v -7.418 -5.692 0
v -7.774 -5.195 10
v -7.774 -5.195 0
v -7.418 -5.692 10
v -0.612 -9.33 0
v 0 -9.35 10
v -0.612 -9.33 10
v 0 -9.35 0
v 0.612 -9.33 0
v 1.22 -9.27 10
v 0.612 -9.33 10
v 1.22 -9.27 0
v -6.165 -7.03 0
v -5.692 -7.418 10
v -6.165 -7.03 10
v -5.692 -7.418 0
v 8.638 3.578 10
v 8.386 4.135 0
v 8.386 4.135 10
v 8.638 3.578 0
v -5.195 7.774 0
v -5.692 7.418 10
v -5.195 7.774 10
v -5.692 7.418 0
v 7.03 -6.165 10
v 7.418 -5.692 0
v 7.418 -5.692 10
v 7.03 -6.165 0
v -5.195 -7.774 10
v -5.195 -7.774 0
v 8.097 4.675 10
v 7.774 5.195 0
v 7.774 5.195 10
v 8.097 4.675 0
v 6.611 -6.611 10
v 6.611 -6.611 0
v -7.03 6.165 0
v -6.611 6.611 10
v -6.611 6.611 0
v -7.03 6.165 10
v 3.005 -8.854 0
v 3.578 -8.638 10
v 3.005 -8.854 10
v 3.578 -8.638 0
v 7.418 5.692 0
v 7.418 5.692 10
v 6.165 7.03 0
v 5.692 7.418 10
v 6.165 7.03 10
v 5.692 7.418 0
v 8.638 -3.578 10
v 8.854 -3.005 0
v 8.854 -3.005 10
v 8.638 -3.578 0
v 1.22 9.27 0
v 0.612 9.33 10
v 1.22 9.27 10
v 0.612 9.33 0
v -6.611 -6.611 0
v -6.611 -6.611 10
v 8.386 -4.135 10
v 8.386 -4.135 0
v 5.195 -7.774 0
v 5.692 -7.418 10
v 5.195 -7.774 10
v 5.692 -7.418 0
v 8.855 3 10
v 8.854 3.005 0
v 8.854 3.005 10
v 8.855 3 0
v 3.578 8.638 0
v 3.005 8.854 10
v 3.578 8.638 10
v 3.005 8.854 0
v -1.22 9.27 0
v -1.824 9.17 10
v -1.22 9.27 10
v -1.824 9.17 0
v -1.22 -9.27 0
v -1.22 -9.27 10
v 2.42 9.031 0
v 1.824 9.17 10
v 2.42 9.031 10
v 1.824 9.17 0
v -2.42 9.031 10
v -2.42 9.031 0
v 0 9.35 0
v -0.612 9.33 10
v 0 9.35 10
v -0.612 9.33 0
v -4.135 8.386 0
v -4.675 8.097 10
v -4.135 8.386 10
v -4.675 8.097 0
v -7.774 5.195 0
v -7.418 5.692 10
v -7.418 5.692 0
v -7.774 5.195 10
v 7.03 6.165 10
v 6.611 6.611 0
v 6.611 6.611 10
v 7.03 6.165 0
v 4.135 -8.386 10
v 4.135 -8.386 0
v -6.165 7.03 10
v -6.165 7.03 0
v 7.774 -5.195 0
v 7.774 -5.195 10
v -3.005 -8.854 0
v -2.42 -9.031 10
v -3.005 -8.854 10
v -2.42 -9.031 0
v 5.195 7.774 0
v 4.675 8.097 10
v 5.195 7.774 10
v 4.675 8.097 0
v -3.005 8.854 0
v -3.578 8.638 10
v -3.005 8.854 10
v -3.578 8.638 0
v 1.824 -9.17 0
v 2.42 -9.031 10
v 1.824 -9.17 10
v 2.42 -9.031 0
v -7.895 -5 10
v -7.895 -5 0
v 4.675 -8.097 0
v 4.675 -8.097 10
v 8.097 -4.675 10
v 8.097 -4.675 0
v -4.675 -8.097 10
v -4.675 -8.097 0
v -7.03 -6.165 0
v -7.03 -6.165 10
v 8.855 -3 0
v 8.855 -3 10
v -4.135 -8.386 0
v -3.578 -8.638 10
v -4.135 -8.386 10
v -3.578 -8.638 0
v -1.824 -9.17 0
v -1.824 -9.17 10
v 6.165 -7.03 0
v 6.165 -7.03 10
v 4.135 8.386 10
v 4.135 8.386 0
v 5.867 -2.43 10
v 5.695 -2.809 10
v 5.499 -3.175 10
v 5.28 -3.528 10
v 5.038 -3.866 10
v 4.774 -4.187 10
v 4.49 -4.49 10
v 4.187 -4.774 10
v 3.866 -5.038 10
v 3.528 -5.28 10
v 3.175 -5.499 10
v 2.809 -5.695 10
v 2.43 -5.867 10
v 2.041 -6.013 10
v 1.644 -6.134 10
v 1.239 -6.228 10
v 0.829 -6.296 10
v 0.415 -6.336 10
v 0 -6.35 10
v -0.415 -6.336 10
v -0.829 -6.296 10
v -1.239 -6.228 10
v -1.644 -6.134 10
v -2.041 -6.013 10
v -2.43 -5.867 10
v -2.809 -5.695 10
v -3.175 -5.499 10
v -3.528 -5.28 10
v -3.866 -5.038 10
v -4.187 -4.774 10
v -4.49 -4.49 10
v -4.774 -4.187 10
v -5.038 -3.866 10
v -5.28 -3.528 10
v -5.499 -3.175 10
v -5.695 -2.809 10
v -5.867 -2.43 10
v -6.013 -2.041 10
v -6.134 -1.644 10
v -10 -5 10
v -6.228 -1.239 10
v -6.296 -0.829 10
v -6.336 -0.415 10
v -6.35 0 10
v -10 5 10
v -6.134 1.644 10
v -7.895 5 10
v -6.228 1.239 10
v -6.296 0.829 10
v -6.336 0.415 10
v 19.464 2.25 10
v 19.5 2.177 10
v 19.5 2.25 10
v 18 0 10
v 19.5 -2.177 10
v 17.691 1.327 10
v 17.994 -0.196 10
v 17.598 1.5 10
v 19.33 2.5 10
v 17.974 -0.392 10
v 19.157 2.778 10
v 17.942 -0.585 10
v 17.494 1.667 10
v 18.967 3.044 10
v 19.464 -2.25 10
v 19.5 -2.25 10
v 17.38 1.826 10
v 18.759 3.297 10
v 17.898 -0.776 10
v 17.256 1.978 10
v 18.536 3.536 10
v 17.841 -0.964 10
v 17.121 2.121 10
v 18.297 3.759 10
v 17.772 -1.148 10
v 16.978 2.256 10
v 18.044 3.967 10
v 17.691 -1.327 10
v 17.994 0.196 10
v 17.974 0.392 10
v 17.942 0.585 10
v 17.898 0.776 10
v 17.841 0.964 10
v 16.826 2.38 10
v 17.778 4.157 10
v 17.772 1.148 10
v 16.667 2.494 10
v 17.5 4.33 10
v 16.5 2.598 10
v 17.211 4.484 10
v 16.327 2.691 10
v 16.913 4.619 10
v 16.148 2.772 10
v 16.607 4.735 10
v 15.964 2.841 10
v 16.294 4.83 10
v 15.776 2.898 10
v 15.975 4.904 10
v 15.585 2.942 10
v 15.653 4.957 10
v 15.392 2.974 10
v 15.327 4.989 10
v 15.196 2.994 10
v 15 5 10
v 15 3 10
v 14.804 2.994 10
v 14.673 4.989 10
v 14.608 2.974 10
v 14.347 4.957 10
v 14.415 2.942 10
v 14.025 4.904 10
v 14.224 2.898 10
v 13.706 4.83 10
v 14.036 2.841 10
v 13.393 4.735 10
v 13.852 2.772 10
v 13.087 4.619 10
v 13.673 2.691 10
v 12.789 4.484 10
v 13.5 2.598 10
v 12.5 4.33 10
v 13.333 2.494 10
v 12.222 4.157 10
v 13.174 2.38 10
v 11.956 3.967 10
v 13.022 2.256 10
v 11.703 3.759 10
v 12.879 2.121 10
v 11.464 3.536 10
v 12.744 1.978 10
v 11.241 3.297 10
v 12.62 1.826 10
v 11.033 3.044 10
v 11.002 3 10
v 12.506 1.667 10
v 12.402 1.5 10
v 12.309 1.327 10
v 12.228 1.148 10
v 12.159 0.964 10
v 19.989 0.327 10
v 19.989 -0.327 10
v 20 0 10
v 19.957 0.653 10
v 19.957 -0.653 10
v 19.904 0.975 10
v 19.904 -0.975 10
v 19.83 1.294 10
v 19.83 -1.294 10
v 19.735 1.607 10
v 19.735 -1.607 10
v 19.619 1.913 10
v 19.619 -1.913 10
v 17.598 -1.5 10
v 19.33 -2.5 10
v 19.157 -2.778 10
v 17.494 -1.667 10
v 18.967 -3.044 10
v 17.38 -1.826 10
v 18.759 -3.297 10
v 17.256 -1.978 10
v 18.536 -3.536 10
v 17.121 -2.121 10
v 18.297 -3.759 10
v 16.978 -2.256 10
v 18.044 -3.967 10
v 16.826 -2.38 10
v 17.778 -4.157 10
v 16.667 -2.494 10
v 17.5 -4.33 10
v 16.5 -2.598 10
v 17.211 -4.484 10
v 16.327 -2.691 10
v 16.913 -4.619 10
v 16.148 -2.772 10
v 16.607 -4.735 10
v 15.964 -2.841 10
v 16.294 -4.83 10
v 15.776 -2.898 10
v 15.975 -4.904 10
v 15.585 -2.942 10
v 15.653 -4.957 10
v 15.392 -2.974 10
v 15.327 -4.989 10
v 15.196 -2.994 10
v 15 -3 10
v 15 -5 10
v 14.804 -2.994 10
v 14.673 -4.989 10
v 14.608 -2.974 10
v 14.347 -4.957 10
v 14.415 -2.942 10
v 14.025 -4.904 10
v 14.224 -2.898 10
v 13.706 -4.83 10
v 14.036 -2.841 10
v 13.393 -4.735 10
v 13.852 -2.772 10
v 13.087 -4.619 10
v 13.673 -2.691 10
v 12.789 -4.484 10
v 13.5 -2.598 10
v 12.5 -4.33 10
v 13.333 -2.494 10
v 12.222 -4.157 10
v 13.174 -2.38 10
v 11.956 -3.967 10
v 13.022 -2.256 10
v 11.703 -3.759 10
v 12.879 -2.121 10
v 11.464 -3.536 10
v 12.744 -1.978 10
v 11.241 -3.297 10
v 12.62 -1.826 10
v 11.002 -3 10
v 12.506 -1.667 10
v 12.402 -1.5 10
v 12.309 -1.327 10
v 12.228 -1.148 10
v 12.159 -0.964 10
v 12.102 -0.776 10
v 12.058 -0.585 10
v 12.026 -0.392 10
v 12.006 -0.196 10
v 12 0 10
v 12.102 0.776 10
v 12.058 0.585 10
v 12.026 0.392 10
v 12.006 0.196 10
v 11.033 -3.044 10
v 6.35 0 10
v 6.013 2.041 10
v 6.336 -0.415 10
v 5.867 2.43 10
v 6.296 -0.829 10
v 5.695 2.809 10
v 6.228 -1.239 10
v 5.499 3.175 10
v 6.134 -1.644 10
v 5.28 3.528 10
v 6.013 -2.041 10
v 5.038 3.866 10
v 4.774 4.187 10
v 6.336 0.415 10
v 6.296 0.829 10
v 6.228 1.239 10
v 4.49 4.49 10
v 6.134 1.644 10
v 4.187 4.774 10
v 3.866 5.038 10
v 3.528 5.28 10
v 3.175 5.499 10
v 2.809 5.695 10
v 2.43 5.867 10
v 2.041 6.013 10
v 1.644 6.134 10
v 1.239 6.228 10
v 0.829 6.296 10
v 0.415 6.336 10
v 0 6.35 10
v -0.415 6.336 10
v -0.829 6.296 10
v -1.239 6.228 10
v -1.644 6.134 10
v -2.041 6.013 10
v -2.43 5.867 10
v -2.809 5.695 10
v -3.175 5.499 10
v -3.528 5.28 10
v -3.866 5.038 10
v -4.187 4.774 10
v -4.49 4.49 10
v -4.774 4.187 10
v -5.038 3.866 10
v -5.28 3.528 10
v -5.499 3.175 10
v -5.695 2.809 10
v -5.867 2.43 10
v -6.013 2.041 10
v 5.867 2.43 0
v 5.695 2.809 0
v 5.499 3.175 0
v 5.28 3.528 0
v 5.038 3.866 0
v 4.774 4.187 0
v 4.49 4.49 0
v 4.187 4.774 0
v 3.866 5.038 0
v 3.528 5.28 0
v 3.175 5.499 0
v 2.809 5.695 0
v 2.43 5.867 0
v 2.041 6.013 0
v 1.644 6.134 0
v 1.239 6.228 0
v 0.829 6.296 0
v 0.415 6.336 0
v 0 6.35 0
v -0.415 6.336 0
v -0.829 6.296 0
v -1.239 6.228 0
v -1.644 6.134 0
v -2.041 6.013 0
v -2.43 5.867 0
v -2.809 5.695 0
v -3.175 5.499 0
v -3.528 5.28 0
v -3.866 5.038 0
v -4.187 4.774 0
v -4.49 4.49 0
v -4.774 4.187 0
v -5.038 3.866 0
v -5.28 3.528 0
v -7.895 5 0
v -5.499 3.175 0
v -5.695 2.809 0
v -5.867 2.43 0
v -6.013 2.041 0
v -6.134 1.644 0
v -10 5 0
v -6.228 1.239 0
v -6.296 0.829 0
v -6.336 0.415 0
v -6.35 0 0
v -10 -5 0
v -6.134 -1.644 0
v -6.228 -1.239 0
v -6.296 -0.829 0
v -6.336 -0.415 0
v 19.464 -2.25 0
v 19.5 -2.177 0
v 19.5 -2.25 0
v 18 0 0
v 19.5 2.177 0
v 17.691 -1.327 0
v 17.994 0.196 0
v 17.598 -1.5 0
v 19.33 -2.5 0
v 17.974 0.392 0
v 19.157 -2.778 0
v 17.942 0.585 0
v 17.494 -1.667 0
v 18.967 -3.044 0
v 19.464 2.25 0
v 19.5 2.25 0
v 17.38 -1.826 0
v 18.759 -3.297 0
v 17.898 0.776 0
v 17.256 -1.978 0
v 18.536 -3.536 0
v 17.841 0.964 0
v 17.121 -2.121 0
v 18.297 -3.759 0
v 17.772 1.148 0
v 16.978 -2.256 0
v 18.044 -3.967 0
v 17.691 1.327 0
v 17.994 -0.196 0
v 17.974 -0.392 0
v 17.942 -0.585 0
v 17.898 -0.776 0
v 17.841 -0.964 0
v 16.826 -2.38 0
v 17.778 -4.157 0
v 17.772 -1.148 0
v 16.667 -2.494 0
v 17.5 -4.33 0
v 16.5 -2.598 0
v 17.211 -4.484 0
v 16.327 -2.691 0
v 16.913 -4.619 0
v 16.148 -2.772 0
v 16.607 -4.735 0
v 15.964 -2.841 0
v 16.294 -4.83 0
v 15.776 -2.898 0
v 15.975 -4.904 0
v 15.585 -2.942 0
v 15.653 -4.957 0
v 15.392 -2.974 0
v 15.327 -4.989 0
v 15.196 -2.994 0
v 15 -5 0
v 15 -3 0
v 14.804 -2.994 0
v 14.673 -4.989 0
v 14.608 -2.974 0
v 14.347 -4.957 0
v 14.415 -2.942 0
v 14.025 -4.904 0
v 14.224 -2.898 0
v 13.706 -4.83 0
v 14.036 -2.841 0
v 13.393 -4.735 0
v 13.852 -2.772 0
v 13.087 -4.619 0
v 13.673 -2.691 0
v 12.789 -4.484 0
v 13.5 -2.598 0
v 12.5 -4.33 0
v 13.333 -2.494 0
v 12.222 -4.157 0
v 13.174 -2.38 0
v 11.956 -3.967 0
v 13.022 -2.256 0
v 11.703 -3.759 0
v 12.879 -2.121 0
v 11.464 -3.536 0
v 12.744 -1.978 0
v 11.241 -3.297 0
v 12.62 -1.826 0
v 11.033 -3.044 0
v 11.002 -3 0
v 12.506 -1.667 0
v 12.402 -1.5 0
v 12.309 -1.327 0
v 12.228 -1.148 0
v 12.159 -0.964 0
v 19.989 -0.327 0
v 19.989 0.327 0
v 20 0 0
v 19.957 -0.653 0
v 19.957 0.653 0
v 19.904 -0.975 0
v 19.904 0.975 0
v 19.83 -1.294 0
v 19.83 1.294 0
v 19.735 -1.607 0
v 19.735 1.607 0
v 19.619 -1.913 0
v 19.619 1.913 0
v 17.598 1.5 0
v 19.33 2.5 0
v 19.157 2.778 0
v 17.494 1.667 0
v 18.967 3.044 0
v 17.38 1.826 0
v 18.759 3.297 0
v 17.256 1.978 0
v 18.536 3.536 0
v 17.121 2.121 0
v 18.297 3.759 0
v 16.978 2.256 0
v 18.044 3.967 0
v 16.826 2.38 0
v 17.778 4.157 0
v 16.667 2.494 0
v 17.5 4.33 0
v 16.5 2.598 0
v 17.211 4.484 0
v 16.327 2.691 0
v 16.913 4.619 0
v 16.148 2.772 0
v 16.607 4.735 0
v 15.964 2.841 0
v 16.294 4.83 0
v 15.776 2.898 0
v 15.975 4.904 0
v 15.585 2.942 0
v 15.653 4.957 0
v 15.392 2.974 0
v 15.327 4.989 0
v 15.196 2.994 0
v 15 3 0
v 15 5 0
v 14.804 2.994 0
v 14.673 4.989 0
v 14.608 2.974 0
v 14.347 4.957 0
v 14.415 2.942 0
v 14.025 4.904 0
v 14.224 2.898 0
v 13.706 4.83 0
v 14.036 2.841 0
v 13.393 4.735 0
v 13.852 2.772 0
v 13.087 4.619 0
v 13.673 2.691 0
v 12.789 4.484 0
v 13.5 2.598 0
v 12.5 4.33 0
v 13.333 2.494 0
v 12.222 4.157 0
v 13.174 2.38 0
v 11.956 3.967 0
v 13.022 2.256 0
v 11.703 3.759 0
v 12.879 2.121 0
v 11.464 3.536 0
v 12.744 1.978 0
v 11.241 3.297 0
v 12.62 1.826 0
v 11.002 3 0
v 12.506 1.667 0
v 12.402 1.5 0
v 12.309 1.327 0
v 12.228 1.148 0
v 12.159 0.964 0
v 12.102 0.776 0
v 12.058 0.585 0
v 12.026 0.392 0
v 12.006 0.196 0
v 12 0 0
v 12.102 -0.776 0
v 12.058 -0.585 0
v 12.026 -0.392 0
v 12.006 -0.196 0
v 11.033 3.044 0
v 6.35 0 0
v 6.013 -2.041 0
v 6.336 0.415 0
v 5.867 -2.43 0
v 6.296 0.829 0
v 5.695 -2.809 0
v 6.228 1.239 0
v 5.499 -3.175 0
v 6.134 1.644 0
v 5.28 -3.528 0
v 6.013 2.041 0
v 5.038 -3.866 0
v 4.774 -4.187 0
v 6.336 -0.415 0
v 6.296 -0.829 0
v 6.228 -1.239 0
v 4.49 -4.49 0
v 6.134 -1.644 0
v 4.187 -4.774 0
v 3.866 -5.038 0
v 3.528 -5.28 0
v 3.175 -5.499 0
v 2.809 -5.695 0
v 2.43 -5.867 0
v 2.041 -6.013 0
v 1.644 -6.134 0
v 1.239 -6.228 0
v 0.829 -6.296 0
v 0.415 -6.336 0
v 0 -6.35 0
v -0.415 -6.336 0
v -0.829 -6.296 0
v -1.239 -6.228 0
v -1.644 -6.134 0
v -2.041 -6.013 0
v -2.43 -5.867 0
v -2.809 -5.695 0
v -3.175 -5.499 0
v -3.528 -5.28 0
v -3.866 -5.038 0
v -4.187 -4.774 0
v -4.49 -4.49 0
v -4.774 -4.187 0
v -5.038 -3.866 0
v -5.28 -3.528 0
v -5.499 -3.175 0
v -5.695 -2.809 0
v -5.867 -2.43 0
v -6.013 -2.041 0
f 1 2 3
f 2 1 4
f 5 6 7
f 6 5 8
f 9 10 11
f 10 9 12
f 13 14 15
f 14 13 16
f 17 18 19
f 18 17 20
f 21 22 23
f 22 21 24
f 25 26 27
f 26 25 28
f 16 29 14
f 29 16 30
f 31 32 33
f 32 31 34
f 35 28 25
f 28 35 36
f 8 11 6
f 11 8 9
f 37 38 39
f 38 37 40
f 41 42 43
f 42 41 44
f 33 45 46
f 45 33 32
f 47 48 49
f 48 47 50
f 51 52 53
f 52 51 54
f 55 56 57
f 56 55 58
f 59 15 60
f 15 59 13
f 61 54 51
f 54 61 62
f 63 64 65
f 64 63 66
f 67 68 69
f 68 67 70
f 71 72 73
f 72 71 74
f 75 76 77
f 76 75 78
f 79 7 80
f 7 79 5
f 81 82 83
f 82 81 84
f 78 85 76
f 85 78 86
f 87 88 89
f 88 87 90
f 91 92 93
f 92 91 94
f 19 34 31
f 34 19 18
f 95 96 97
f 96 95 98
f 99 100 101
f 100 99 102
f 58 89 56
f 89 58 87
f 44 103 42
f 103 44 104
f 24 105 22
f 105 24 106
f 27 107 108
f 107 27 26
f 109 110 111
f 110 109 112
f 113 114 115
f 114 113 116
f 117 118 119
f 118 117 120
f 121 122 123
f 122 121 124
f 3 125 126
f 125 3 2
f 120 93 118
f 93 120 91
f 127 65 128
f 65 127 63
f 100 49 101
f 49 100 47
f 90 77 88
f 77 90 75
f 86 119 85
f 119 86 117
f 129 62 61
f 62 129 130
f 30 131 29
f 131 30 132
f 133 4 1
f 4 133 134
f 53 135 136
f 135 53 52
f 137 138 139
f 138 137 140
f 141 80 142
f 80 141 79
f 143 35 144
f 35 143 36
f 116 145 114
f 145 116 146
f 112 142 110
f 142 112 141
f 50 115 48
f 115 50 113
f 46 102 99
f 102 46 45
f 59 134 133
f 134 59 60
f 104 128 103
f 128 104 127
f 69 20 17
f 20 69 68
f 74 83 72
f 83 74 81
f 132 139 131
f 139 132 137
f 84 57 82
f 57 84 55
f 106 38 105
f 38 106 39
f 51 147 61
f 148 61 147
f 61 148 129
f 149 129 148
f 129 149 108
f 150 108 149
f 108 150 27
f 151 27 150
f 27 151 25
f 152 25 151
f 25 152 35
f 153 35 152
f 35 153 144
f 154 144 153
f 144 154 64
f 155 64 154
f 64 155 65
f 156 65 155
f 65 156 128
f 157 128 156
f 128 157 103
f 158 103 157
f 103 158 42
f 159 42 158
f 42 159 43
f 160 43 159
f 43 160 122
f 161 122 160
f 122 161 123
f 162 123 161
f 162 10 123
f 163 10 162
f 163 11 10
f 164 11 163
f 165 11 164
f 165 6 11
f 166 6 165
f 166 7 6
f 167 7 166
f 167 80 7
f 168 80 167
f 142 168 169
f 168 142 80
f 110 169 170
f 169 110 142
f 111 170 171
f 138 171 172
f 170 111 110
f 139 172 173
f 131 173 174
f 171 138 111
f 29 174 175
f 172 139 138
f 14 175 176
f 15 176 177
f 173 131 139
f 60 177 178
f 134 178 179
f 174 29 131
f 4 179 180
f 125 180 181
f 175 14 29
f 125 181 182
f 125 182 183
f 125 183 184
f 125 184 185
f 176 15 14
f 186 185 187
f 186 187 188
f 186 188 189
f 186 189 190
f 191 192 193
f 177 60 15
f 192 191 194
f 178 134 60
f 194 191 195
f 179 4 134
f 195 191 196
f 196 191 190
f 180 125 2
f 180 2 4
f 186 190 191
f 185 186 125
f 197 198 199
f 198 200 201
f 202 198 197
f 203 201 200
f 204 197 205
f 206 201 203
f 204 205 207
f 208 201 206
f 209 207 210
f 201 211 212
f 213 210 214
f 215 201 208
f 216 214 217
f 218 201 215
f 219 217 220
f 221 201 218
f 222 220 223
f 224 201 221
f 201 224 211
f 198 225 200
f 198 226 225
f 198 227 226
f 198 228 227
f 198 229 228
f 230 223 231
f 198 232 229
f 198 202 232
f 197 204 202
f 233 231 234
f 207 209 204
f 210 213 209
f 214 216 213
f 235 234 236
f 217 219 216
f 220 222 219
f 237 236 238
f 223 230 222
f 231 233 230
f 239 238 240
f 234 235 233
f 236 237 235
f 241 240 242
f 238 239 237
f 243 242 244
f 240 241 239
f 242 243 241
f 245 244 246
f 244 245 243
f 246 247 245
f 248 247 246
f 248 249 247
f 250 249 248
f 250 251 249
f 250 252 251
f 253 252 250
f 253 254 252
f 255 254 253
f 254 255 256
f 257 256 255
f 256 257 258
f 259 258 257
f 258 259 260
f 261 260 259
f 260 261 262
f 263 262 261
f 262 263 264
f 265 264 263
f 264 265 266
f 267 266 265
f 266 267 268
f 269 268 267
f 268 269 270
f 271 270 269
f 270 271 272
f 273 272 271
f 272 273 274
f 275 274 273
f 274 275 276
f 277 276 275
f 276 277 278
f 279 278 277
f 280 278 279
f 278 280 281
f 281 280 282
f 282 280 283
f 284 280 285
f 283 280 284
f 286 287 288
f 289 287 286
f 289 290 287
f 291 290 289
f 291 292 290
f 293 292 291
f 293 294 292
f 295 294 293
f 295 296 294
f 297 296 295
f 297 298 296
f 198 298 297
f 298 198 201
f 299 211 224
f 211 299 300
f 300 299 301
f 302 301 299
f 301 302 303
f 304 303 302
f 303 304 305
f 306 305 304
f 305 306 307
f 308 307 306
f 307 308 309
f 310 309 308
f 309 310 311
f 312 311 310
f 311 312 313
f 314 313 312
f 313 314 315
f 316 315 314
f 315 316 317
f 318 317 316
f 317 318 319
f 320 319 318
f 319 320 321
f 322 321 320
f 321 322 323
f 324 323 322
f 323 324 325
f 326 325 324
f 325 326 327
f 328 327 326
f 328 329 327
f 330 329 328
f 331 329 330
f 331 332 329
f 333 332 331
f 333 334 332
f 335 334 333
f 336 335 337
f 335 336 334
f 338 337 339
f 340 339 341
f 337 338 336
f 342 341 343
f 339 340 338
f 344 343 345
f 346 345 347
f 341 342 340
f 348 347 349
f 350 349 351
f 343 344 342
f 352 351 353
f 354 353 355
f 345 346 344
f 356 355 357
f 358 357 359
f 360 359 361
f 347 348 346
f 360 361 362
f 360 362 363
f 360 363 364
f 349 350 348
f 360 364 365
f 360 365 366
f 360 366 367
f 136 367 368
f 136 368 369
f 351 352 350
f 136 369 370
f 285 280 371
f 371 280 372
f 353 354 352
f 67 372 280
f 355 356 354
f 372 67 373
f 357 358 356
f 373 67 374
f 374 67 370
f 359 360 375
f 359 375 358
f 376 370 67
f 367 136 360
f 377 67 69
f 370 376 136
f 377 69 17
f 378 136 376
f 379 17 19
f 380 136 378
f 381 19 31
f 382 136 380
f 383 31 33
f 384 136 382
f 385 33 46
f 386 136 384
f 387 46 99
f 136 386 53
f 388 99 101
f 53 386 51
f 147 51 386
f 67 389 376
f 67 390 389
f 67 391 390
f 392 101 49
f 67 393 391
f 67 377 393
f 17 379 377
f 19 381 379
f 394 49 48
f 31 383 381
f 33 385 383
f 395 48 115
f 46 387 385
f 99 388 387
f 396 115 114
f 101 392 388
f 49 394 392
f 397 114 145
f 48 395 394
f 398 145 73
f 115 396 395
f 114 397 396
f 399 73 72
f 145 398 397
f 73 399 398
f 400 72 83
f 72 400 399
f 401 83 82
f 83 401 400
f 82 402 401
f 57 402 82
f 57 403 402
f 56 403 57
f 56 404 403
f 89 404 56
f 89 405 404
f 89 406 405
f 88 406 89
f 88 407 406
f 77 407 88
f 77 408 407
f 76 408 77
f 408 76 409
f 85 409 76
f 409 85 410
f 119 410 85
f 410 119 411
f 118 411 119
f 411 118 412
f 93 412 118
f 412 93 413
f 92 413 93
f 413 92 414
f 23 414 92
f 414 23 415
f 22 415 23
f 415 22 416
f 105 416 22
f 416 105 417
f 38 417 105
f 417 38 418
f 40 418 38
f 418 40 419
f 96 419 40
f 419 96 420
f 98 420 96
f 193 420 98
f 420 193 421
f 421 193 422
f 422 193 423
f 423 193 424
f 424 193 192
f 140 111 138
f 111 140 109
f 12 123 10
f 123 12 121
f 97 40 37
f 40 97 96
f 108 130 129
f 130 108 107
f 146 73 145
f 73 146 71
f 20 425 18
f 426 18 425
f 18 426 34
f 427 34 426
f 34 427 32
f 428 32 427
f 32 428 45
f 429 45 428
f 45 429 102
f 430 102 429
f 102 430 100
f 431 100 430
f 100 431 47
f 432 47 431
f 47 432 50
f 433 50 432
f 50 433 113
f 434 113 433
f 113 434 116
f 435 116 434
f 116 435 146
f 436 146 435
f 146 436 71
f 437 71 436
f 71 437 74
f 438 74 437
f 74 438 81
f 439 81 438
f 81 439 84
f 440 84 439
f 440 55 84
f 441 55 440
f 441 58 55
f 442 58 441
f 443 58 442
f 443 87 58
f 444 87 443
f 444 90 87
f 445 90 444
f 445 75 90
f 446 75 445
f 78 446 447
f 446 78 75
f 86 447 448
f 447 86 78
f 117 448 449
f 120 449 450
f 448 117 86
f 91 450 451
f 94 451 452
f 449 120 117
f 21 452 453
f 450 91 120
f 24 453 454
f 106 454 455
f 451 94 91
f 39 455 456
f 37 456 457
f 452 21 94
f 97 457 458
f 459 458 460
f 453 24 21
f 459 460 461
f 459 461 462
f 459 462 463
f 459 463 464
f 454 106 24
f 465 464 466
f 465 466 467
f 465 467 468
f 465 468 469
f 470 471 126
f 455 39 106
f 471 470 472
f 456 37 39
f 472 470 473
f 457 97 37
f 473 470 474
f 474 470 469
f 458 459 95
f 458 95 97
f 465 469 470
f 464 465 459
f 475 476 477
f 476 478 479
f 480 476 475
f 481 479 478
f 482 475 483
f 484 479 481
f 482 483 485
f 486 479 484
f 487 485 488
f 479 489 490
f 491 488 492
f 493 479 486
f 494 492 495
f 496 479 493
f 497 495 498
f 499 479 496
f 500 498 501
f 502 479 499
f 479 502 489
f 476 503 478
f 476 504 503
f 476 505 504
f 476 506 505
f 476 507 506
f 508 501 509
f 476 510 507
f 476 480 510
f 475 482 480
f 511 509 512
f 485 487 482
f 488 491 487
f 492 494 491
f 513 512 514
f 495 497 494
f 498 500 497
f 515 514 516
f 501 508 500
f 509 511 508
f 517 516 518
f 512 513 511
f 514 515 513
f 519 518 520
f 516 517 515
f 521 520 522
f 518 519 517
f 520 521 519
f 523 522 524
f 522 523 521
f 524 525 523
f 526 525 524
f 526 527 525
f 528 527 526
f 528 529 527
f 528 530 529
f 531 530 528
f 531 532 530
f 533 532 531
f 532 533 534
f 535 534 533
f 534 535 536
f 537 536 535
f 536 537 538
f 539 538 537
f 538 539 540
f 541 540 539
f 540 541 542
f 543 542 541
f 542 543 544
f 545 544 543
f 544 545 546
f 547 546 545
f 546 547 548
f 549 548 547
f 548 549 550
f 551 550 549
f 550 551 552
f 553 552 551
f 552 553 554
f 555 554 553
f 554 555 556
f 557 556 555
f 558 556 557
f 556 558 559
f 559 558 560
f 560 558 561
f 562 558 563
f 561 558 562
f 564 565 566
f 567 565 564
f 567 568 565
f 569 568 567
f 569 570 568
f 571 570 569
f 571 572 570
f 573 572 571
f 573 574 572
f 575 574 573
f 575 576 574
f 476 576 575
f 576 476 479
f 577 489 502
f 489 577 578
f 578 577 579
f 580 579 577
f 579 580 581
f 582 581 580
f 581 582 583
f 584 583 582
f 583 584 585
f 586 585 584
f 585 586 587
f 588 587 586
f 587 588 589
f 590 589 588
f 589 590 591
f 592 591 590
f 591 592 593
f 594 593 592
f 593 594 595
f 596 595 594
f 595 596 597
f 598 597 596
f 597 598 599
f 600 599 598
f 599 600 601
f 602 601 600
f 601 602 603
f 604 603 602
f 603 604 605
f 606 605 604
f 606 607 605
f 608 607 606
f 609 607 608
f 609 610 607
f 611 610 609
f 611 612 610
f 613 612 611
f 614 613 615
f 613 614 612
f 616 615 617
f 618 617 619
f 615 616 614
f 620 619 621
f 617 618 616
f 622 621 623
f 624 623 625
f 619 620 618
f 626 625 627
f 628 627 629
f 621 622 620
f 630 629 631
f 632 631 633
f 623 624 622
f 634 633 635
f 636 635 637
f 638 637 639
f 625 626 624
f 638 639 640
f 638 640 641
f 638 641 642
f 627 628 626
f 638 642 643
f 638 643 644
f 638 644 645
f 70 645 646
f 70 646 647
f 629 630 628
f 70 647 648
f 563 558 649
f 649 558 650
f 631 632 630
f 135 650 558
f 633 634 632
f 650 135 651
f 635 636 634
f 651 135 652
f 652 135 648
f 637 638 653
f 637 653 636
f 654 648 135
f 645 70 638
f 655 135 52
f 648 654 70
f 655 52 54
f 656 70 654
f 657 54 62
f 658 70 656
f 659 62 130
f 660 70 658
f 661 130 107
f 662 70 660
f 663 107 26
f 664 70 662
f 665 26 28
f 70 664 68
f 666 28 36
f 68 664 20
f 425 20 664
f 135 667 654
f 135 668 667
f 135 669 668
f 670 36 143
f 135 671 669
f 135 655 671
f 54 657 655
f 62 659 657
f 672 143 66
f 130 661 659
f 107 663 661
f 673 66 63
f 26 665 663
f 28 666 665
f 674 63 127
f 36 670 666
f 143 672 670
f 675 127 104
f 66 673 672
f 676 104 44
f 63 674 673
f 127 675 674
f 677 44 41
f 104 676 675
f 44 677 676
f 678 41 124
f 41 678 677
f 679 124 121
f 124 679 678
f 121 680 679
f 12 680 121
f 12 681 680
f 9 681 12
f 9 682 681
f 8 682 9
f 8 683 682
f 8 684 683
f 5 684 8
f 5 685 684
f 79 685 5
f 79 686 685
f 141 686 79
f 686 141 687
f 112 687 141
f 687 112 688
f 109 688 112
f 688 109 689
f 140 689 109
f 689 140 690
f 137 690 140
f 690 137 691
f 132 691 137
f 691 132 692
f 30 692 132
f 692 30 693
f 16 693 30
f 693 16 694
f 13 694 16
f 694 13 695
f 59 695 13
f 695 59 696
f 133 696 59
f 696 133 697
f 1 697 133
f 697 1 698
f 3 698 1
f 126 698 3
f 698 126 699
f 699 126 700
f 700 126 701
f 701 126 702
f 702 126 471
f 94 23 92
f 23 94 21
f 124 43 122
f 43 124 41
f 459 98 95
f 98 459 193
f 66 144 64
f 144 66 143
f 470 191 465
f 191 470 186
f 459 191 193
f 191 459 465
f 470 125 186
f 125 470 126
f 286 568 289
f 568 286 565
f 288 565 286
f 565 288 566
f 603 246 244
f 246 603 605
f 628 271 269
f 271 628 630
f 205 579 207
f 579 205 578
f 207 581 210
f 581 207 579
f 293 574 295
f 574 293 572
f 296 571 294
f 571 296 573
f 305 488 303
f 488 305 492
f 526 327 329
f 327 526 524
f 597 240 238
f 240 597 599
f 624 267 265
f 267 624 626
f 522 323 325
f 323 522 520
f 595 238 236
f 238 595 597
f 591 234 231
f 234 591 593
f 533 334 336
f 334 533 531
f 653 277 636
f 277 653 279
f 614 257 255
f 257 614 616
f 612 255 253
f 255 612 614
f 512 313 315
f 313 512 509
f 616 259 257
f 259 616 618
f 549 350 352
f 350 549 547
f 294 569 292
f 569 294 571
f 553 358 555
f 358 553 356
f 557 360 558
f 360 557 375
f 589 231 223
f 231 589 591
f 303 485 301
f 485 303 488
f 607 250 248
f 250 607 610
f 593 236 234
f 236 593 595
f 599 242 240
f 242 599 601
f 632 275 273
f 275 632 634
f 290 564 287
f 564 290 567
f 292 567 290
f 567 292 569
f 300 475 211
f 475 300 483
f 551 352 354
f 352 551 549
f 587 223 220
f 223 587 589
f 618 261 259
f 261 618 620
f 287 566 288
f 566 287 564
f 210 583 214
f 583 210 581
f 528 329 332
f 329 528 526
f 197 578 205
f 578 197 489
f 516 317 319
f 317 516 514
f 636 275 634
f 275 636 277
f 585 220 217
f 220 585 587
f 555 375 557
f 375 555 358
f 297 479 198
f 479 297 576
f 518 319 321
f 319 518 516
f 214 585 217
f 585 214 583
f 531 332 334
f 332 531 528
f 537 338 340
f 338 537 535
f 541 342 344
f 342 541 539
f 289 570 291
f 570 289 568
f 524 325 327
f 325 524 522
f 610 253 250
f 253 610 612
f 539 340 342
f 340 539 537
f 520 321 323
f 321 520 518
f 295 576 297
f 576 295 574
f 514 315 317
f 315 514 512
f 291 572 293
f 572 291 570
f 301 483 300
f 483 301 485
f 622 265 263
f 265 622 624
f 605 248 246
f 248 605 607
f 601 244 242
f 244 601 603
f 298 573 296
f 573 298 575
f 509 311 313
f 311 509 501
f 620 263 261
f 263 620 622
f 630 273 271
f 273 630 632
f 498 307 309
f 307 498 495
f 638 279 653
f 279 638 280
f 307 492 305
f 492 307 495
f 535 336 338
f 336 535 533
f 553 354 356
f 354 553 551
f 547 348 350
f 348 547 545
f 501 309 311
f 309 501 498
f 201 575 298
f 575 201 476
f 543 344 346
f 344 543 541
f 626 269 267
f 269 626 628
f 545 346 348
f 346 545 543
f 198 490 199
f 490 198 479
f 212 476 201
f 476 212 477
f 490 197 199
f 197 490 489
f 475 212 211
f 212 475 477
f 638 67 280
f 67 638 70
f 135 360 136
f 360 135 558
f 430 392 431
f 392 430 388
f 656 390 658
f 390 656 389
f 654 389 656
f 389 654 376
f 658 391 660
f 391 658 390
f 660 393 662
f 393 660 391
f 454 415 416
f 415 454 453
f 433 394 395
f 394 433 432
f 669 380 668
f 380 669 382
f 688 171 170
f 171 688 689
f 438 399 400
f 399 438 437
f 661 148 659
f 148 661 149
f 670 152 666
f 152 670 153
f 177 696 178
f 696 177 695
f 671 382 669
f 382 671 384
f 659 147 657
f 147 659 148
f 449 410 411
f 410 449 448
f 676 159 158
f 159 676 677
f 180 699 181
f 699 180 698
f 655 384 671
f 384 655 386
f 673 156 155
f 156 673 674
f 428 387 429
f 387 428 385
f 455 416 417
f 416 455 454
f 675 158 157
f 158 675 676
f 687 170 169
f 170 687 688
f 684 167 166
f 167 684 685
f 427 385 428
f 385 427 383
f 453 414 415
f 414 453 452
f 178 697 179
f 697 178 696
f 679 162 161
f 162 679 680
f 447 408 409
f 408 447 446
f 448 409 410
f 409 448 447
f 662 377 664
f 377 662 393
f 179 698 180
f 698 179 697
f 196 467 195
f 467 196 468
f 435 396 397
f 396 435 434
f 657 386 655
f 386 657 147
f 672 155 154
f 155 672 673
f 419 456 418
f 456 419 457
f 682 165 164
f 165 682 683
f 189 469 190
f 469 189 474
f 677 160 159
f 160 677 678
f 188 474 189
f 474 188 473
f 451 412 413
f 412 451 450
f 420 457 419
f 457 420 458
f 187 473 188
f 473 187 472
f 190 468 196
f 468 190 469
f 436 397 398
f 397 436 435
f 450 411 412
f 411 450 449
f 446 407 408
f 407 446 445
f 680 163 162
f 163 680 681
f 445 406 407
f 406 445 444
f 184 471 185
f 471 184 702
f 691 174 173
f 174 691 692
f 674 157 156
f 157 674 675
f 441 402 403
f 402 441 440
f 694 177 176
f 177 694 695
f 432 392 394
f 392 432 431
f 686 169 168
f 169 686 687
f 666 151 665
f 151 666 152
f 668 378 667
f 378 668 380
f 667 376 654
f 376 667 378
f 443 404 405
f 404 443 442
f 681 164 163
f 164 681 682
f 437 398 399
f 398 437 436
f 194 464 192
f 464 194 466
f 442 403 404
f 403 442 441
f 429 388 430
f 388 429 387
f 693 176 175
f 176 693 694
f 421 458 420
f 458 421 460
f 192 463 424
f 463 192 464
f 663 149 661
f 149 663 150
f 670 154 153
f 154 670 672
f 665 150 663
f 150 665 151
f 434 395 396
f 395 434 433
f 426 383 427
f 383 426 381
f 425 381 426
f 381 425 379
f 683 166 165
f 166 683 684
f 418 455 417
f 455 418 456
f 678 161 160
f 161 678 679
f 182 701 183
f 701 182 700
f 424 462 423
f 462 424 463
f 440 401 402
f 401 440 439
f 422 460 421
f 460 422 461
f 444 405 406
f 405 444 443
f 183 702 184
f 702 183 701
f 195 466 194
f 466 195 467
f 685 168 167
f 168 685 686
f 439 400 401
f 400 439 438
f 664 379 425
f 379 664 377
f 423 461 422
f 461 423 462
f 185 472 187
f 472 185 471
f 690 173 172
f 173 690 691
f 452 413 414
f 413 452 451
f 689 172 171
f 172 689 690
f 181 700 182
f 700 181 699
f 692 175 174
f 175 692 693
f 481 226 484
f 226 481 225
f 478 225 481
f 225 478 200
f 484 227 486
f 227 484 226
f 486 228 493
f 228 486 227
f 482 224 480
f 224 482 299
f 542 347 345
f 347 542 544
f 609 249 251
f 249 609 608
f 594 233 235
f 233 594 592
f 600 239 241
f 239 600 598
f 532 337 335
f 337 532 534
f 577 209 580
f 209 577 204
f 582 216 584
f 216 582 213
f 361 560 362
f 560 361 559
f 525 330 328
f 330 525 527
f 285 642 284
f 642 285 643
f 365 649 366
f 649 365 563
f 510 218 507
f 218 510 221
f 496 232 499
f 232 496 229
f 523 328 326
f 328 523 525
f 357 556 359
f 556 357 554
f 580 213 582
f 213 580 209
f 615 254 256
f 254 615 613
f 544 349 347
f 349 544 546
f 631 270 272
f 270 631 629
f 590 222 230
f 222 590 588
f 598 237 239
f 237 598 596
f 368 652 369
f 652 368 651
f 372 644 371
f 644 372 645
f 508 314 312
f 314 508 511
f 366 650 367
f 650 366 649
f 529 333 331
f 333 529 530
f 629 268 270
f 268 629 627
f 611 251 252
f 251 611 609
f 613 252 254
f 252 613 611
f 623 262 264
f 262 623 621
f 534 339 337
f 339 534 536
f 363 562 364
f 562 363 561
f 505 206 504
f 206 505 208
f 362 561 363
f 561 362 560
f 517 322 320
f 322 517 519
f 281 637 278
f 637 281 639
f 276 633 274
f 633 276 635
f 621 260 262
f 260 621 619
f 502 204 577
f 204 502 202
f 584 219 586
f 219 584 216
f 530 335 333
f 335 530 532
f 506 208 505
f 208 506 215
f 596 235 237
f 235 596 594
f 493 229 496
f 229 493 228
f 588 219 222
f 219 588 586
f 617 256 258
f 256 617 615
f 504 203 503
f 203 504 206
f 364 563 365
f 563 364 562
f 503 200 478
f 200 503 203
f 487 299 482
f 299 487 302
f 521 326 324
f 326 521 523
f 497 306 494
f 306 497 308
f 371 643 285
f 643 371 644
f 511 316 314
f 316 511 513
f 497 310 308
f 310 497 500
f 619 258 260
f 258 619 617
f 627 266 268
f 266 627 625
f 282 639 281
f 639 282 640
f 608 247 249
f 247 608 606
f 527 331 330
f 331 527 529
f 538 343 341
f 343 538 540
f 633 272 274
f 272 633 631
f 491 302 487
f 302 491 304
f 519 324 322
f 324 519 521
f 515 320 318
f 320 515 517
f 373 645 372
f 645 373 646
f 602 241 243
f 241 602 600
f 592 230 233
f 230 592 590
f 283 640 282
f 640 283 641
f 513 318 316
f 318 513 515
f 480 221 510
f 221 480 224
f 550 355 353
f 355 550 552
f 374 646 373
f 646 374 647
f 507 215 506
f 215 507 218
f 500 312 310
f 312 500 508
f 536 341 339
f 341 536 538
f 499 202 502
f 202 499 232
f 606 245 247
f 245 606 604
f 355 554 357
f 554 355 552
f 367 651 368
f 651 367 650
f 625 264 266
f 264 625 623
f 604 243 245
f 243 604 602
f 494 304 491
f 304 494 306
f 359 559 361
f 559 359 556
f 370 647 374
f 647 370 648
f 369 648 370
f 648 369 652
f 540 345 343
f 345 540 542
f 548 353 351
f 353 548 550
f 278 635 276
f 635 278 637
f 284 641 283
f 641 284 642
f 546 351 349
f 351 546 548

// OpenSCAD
// Snap-on tubing clip for 12.7 mm stand rod
// Print orientation: flat on bed, extrusion along +Z

$fn = 96;

// ---- Dimensions (mm) ----
stand_d      = 12.7;  // stand rod diameter
stand_w      = 3;     // stand ring wall
stand_od     = stand_d + 2 * stand_w;  // 18.7 outer diameter
stand_open   = 10;    // stand opening width (-X side)

tube_d       = 6;     // tubing inner diameter
tube_w       = 2;     // tubing wall
tube_od      = tube_d + 2 * tube_w;    // 10 outer diameter
tube_x       = 15;    // tubing ring centre X
tube_open    = 4.5;   // tubing opening width (+X side)

bridge_x0    = 8;     // bridge start X
bridge_x1    = 12;    // bridge end X
bridge_w     = 6;     // bridge width (Y)

eps          = 0.5;   // cutter overshoot

// ---- Model ----
difference() {
    union() {
        // Stand ring
        cylinder(d = stand_od, h = 10);
        translate([-stand_open, -stand_open/2, 0])
            cube([stand_open, stand_open, 10]);

        // Tubing ring
        translate([tube_x, 0, 0])
            cylinder(d = tube_od, h = 10);
        translate([tube_x, -tube_open/2, 0])
            cube([tube_open, tube_open, 10]);

        // Bridge
        translate([bridge_x0, -bridge_w/2, 0])
            cube([bridge_x1 - bridge_x0, bridge_w, 10]);
    }

    // Stand rod hole
    translate([0, 0, -eps])
        cylinder(d = stand_d, h = 10 + 2 * eps);

    // Tubing hole
    translate([tube_x, 0, -eps])
        cylinder(d = tube_d, h = 10 + 2 * eps);
}
